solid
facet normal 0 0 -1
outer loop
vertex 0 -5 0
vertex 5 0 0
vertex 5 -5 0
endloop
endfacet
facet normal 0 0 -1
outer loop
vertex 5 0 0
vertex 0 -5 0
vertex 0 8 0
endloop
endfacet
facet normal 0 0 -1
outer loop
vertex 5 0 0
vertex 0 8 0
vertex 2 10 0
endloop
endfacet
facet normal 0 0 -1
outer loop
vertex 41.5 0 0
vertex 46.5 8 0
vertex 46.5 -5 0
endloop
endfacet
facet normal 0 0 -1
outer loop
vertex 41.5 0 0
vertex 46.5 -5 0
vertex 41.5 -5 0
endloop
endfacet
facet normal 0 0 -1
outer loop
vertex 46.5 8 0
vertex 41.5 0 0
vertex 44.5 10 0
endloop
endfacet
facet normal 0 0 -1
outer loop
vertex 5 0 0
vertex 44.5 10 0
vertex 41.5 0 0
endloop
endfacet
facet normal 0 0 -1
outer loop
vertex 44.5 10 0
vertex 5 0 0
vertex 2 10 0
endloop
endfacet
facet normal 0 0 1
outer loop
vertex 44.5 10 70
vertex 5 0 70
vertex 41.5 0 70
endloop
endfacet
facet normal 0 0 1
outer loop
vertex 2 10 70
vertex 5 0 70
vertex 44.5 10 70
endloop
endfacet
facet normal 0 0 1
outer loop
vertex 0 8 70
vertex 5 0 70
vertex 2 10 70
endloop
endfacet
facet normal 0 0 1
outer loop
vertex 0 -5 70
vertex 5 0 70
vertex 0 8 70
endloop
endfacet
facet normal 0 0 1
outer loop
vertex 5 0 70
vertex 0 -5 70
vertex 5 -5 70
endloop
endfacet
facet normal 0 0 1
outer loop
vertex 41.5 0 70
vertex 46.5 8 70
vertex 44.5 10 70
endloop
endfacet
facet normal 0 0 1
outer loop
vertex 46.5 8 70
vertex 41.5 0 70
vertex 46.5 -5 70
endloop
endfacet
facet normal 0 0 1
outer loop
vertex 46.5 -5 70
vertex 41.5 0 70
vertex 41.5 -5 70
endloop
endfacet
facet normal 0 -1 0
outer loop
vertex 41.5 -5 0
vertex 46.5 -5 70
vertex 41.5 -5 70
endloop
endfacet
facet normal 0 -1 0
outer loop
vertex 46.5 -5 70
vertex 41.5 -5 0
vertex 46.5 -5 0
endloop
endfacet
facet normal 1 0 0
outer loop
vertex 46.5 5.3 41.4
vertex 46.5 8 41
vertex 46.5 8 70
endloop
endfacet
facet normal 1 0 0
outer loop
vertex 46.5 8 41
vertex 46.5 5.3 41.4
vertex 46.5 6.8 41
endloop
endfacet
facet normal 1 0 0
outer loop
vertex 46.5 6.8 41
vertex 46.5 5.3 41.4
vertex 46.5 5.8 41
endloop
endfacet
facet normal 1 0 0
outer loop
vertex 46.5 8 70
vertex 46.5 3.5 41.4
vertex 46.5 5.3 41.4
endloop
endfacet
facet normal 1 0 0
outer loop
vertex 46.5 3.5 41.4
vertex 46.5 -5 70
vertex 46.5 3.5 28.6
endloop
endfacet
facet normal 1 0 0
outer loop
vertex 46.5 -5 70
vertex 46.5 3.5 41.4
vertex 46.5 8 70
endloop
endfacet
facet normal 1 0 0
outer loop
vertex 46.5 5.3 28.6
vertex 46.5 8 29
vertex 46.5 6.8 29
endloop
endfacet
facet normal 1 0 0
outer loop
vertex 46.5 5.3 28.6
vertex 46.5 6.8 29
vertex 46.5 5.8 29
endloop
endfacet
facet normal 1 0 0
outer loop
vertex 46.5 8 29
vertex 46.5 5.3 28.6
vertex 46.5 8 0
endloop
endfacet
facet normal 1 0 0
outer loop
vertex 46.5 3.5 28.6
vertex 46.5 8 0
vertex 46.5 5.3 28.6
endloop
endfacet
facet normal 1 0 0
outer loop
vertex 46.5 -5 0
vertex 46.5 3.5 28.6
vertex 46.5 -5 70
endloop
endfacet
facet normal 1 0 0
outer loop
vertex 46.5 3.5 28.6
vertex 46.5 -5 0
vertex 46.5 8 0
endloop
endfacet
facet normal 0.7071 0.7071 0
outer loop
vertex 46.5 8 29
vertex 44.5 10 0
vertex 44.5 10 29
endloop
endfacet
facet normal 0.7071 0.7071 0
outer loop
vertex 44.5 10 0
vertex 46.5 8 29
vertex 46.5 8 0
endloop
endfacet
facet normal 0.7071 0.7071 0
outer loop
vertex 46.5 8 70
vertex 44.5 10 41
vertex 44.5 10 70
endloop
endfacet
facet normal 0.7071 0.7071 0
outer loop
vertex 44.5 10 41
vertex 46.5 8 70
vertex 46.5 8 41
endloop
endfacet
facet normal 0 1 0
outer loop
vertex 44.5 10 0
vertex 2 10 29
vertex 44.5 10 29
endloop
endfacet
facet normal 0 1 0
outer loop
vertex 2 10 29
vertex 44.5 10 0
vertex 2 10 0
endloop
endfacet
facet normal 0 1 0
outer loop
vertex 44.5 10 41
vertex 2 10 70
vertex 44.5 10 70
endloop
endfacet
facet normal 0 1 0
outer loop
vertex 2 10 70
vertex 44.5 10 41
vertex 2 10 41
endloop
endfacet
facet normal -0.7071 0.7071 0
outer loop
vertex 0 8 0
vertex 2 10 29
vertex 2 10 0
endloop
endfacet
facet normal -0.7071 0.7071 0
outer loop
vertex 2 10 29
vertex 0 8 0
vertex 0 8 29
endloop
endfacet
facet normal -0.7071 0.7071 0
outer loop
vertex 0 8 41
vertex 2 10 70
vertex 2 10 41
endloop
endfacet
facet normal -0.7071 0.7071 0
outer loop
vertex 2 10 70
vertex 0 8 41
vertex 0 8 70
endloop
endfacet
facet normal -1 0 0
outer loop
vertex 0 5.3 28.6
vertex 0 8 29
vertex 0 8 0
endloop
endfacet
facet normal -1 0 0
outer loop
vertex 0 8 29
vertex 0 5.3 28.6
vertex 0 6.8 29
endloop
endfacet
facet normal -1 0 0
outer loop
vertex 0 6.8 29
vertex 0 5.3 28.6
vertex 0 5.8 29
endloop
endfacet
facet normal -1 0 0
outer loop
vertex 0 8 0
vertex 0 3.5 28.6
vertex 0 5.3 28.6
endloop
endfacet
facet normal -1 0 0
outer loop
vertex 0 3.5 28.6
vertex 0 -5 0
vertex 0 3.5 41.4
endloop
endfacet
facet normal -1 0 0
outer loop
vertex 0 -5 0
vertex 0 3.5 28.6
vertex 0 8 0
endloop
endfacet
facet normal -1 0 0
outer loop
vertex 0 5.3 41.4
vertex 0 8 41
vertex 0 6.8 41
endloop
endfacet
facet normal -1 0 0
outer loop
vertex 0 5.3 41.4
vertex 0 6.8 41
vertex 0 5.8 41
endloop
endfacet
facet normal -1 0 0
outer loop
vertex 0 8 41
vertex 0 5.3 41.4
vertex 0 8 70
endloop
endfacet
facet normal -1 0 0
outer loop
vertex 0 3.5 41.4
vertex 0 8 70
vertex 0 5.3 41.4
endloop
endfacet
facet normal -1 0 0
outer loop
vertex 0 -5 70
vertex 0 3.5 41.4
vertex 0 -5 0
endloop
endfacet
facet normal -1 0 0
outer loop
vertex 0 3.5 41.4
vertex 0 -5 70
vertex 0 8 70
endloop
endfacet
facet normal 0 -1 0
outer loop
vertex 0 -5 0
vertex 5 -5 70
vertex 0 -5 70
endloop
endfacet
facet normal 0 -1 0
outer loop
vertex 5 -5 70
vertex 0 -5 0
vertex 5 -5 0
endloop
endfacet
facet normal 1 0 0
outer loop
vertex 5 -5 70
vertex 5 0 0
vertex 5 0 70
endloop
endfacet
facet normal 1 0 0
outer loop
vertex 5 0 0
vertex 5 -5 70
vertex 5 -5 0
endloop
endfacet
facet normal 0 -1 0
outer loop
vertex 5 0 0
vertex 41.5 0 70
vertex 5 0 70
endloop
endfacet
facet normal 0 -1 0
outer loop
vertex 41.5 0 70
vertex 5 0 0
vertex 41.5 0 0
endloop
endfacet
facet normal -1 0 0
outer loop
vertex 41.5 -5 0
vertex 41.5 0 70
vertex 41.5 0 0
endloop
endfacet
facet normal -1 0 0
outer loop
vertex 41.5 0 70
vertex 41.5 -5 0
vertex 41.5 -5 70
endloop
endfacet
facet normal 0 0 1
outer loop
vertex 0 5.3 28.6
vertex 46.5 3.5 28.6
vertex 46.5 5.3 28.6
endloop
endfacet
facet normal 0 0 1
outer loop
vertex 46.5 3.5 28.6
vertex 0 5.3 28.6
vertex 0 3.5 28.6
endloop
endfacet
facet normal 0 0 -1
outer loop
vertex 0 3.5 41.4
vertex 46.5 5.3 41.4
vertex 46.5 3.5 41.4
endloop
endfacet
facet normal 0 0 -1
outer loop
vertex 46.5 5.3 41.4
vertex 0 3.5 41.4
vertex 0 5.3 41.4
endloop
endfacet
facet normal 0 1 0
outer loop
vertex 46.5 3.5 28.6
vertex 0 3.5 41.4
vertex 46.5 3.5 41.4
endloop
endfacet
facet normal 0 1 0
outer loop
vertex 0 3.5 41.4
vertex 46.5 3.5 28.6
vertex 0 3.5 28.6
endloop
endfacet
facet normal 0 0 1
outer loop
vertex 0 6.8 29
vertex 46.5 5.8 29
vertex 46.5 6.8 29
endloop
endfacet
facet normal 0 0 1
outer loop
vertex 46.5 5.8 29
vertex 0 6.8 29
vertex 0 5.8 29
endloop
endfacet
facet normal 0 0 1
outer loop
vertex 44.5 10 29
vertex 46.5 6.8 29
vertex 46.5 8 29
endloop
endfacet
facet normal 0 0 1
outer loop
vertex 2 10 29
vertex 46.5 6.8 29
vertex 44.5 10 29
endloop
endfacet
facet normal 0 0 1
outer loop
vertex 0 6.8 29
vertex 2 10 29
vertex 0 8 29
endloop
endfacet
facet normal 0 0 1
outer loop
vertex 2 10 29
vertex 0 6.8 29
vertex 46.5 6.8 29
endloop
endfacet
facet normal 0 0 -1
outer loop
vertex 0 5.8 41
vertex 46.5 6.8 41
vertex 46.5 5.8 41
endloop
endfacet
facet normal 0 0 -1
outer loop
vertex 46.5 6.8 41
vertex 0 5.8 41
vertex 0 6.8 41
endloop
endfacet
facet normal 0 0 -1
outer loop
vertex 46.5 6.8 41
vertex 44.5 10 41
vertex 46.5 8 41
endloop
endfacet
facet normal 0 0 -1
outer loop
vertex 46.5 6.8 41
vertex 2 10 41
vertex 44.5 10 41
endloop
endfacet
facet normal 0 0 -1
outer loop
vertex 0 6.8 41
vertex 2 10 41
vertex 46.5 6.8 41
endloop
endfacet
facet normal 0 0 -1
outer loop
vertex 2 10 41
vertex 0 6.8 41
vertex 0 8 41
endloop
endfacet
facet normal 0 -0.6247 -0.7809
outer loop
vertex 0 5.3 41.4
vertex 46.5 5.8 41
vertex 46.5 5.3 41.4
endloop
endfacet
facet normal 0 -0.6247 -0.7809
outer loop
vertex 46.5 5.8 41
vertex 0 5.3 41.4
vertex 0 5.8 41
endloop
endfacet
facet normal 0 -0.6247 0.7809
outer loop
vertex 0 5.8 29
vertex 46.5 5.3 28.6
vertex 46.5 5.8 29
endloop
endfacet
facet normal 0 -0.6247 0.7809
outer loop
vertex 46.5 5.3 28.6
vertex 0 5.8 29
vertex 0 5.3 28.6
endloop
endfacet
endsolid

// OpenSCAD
union(){
    difference(){
        linear_extrude(70){
                union(){
                    polygon([[0,8],[2,10],[44.5,10],[46.5,8],[46.5,0],[0,0]]);
                    translate([0,-5,0]) square([5,8]);
                    translate([41.5,-5,0]) square([5,5]);
                }
        }
        // 長い方の溝
        color([0.8,0,0])
        translate([0,3.5,28.6]){
            linear_extrude(12.8){
                square([46.5,3]);
            }
        }
        // 短い方の溝
        color([0,0,0.8])
        translate([0,4,29]){
            linear_extrude(12){
                square([46.5,6]);
            }
        }
    }
    // 補正（上の溝）
    color([0,0.8,0])
    translate([0,5.3,41.4]){
        hull(){
            translate([0,0.5,-0.4]) cube([46.5,1,0.01]);
            cube([46.5,1.5,0.01]);
        }
    }

    // 補正（下の溝）
    color([0,0.8,0])
    translate([0,5.3,28.59]){
        hull(){
            translate([0,0.5,0.4]) cube([46.5,1,0.01]);
            cube([46.5,1.5,0.01]);
        }
    }
}
